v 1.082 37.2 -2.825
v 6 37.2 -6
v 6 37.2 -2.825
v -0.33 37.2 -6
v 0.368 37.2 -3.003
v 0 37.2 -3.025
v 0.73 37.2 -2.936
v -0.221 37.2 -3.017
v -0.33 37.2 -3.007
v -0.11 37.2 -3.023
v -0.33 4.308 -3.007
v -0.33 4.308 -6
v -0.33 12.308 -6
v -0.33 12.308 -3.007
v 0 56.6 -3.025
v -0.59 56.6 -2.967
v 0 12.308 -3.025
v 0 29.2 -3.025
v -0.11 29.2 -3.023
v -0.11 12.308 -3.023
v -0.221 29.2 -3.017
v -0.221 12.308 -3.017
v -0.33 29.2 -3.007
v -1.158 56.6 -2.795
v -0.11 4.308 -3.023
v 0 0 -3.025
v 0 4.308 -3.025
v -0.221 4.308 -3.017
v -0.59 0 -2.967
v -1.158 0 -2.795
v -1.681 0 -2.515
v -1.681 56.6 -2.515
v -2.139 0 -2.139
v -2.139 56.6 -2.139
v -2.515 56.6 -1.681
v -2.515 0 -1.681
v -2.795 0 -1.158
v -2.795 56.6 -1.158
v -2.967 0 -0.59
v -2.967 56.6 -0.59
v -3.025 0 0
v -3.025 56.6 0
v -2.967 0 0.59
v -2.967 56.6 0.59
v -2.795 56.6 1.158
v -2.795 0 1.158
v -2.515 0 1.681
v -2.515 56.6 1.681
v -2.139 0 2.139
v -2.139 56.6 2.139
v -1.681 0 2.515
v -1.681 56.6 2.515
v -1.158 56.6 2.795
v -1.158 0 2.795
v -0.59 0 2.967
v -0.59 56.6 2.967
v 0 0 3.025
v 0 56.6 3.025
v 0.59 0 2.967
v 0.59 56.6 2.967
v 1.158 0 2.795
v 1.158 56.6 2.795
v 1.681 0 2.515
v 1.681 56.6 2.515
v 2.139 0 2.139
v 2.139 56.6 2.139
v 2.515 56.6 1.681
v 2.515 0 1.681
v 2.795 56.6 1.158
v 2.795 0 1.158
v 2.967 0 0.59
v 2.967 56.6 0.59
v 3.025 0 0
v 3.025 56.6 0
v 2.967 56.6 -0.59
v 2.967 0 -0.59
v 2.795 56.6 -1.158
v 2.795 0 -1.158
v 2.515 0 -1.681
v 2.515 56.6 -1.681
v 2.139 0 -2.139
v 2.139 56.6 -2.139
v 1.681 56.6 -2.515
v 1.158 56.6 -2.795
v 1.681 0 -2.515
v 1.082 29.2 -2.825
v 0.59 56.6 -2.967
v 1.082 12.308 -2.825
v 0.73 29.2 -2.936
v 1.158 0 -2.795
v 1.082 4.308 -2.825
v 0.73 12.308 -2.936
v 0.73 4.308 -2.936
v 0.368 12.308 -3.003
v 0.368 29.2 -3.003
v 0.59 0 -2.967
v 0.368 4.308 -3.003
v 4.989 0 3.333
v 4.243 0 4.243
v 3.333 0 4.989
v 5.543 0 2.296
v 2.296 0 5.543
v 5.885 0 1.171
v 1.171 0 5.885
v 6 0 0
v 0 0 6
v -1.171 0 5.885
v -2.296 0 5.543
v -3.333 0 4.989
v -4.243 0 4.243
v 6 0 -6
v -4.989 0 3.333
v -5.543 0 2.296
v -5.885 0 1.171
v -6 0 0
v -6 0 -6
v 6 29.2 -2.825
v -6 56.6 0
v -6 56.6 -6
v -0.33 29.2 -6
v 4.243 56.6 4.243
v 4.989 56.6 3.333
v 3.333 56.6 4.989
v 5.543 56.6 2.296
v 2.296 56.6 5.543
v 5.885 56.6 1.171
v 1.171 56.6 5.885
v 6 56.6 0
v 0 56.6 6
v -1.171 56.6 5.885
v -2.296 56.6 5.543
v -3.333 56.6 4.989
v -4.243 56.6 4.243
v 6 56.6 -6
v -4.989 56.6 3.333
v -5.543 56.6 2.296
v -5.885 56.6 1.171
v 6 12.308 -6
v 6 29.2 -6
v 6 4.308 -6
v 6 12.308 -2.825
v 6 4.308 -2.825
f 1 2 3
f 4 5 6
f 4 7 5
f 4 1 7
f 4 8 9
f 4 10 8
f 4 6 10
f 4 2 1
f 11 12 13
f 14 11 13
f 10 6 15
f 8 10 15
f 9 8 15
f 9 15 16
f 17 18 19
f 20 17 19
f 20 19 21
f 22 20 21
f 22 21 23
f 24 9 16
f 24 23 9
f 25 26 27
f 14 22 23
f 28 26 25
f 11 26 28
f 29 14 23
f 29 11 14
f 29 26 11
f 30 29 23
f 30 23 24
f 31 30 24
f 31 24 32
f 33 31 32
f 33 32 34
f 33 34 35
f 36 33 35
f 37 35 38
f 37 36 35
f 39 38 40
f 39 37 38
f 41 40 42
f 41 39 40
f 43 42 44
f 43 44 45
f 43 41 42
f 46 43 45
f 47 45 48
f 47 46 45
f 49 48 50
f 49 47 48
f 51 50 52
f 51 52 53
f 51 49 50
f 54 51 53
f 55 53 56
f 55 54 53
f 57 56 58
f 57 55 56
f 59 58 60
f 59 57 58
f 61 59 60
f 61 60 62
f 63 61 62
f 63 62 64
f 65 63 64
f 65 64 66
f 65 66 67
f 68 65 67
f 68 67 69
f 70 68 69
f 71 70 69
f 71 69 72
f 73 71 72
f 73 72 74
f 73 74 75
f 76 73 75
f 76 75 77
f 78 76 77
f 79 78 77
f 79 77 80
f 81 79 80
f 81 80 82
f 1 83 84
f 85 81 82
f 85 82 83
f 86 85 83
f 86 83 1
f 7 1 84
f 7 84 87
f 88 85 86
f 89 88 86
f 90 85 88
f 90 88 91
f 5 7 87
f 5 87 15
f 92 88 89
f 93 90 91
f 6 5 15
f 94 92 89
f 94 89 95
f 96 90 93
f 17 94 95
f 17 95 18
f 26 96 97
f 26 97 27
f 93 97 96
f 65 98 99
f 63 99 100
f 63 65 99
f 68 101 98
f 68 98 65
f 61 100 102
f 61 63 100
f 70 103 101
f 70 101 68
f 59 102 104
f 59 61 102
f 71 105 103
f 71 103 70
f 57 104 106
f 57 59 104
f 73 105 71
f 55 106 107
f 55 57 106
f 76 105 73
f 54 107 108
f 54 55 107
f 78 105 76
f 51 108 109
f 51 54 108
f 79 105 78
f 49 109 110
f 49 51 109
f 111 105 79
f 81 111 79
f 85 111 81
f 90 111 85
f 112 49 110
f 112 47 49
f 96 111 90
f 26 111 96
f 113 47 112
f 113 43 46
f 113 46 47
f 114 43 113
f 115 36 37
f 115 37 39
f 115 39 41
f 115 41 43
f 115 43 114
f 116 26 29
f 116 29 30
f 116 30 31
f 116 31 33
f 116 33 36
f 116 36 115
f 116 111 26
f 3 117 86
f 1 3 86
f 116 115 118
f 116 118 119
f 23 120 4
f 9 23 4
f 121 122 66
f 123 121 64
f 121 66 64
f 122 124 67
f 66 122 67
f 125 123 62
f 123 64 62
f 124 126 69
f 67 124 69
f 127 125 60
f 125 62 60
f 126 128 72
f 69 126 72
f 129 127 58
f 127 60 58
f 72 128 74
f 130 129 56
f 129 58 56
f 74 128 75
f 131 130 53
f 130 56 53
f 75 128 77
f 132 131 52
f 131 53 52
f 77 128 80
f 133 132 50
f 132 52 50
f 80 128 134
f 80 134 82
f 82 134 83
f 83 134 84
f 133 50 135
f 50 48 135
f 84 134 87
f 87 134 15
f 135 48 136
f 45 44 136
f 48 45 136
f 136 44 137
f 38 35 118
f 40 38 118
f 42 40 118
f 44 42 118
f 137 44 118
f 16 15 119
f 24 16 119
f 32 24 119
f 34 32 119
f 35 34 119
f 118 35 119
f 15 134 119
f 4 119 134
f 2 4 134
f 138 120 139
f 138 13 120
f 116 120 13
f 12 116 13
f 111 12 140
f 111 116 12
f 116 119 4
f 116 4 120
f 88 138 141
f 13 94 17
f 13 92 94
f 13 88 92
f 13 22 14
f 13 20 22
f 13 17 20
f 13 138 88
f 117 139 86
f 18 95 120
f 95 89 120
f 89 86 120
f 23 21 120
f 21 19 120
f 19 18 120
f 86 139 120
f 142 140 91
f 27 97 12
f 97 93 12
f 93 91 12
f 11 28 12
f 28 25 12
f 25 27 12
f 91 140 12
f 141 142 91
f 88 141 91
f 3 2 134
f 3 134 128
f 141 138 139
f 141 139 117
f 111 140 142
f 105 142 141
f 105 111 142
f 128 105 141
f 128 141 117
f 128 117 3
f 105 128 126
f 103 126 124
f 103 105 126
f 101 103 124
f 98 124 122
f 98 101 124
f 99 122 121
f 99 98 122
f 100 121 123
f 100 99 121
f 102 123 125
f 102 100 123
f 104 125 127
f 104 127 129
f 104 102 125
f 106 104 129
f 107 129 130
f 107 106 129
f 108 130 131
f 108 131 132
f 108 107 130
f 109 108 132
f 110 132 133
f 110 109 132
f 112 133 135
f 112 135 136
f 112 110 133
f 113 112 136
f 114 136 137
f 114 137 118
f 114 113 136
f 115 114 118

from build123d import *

# Parameters (mm, degrees)
SKETCH1_R           = 3.025
BOSS_EXTRUDE1_DEPTH = 56.6
SKETCH2_W           = 8
SKETCH2_H           = 8
CUT_EXTRUDE1_DEPTH  = 3.175


with BuildPart() as part:
    # Sketch1 → Boss-Extrude1 (new body)
    with BuildSketch(Plane(origin=(0, 0, 0), x_dir=(1, 0, 0), z_dir=(0, 1, 0))):
        with BuildLine():
            Line((-6, 0), (-6, 5.43))
            Line((-6, 5.43), (-6, 6))
            Line((-6, 6), (6, 6))
            Line((6, 6), (6, 5.43))
            Line((6, 5.43), (6, 0))
            ThreePointArc((6, 0), (0, -6), (-6, 0))
        make_face()
        with Locations(Location((0, 0, 0), (0, 0, 90))):
            Circle(SKETCH1_R, mode=Mode.SUBTRACT)
    extrude(amount=BOSS_EXTRUDE1_DEPTH)

    # Sketch2 → Cut-Extrude1 (cut)
    with BuildSketch(Plane(origin=(0, 0, -6), x_dir=(-1, 0, 0), z_dir=(0, 0, -1))):
        with Locations((-3.669604029, 8.307999034)):
            Rectangle(SKETCH2_W, SKETCH2_H)
        with Locations((-3.669606205, 33.199999034)):
            Rectangle(SKETCH2_W, SKETCH2_H)
    extrude(amount=-CUT_EXTRUDE1_DEPTH, mode=Mode.SUBTRACT)


solid = part.part
